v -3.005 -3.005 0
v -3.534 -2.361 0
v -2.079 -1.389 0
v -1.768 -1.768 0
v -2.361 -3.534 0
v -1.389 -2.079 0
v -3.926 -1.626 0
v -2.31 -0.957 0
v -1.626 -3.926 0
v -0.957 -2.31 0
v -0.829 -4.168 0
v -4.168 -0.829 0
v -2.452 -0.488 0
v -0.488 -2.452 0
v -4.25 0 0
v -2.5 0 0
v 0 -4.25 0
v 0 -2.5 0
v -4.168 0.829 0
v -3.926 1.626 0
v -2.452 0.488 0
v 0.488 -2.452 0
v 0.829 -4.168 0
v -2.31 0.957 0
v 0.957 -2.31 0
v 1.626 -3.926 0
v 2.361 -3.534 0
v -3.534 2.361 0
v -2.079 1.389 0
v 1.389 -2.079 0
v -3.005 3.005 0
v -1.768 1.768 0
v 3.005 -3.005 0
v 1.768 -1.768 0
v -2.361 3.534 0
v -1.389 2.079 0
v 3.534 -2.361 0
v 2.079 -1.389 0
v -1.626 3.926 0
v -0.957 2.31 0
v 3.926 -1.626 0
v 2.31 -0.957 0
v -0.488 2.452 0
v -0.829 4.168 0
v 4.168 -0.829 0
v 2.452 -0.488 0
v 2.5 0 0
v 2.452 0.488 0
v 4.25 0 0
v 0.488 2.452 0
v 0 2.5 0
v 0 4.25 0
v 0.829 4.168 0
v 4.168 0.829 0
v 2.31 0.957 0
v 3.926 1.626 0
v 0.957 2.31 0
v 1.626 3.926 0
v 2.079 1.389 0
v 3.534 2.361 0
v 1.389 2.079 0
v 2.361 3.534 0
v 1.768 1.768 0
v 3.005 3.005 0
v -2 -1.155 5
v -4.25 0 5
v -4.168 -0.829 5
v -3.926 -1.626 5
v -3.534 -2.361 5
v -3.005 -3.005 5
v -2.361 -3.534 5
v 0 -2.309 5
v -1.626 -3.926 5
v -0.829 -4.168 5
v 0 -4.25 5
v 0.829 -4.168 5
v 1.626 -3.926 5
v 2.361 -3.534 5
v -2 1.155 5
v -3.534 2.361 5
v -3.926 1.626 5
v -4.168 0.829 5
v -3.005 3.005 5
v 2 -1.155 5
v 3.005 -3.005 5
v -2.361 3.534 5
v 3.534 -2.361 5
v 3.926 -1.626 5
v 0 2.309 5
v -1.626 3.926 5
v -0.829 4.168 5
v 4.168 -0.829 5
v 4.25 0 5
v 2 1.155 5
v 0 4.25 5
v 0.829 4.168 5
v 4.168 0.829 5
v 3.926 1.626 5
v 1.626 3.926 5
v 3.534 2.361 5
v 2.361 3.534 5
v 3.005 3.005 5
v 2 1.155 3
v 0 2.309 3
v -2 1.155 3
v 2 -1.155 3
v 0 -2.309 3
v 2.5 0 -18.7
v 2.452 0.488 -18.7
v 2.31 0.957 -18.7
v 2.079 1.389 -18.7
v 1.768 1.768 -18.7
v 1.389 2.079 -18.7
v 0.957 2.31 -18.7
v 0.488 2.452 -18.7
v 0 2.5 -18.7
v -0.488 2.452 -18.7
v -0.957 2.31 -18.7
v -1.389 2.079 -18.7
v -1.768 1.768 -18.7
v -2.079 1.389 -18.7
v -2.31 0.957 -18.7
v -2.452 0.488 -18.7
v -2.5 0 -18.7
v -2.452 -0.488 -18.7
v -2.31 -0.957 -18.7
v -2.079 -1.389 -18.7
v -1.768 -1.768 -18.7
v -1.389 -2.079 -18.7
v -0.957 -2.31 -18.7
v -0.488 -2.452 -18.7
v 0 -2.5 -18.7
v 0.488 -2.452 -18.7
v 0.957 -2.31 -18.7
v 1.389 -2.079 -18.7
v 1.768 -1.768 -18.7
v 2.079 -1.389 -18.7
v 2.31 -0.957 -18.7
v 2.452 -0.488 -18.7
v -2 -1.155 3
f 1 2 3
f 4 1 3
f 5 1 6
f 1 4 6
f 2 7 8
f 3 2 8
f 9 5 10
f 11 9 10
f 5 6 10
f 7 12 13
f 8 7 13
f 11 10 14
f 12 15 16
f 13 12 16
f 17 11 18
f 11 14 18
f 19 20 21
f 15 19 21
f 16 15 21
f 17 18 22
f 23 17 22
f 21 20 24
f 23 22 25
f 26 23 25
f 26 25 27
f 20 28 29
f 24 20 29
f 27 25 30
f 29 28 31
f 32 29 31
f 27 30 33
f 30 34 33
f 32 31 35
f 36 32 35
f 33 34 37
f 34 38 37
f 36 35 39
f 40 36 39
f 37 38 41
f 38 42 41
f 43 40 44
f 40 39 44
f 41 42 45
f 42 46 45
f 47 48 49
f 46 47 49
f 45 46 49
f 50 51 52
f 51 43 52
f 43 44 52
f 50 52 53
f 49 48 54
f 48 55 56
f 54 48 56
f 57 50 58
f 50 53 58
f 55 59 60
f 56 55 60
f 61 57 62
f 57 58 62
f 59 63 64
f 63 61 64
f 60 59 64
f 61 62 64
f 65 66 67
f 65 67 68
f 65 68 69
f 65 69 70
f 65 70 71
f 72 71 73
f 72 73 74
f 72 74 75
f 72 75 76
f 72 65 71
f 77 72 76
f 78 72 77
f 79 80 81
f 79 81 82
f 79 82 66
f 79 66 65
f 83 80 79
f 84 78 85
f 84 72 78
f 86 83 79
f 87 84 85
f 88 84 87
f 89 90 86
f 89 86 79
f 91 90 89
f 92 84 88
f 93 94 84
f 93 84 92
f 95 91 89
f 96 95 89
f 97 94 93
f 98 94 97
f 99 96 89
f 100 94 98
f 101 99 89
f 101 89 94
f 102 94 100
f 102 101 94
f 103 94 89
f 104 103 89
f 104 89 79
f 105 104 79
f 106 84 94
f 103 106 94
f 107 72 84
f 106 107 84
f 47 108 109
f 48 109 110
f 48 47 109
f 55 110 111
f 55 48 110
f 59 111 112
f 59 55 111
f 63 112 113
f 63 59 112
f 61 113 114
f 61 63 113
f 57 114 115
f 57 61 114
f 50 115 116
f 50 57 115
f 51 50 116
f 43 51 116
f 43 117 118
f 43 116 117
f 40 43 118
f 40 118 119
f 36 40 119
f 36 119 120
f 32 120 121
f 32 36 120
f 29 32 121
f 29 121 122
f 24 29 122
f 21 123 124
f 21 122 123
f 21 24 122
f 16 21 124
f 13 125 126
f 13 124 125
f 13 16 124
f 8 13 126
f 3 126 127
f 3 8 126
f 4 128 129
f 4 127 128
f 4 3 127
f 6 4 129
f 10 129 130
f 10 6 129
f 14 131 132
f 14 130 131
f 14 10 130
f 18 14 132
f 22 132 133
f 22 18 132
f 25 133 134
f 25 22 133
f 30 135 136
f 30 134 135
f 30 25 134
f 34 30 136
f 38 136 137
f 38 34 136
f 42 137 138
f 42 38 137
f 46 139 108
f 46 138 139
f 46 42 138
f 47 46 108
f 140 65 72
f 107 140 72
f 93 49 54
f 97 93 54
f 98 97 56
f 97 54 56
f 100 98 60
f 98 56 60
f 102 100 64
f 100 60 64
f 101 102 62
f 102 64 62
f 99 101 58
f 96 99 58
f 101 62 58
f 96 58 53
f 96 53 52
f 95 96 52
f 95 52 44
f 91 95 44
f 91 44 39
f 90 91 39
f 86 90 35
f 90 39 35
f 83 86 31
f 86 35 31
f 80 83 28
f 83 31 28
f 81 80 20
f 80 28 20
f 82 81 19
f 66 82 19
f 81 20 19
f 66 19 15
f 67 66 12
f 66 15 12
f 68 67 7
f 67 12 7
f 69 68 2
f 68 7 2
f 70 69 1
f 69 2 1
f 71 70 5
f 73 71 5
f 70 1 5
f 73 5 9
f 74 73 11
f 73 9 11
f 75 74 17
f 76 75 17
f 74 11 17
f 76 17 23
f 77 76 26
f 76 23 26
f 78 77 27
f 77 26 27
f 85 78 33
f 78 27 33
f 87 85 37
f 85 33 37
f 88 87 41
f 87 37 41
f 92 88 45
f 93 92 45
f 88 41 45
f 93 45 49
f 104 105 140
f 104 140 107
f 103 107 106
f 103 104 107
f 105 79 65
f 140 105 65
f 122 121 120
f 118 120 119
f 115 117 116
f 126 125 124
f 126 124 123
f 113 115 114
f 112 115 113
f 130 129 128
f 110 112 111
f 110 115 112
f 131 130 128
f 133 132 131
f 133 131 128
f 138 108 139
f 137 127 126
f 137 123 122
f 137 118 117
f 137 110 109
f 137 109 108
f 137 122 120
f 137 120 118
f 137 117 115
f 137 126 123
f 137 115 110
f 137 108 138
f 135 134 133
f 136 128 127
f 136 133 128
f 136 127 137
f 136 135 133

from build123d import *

# Parameters (mm, degrees)
F0_R      = 4.25
F1_DEPTH  = 5
F3_DEPTH  = 2
F4_R      = 2.5
F5_DEPTH  = 40
F5_FACE_R = 2.5
F6_DEPTH  = 22.7
F7_DEPTH  = 21.3


with BuildPart() as f1:
    # F0 (on Top) → F1 (new body)
    with BuildSketch(Plane.XY):
        Circle(F0_R)
    extrude(amount=F1_DEPTH)

    # F2 (on face) → F3 (cut)
    with BuildSketch(Plane.XY.offset(5)):
        Polygon((2, -1.154701), (2, 1.154701), (0, 2.309401), (-2, 1.154701), (-2, -1.154701), (0, -2.309401), align=None)
    extrude(amount=-F3_DEPTH, mode=Mode.SUBTRACT)

    # F4 (on Top) → F5 (join)
    with BuildSketch(Plane.XY):
        Circle(F4_R)
    extrude(amount=-F5_DEPTH)

    # F5_face (on face) → F6 (join)
    with BuildSketch(Plane(origin=(0, 0, -40), x_dir=(1, 0, 0), z_dir=(0, 0, -1))):
        Circle(F5_FACE_R)
    extrude(amount=-F6_DEPTH)

    # F5_face (on face) → F7 (cut)
    with BuildSketch(Plane(origin=(0, 0, -40), x_dir=(1, 0, 0), z_dir=(0, 0, -1))):
        Circle(F5_FACE_R)
    extrude(amount=-F7_DEPTH, mode=Mode.SUBTRACT)


solid = f1.part
